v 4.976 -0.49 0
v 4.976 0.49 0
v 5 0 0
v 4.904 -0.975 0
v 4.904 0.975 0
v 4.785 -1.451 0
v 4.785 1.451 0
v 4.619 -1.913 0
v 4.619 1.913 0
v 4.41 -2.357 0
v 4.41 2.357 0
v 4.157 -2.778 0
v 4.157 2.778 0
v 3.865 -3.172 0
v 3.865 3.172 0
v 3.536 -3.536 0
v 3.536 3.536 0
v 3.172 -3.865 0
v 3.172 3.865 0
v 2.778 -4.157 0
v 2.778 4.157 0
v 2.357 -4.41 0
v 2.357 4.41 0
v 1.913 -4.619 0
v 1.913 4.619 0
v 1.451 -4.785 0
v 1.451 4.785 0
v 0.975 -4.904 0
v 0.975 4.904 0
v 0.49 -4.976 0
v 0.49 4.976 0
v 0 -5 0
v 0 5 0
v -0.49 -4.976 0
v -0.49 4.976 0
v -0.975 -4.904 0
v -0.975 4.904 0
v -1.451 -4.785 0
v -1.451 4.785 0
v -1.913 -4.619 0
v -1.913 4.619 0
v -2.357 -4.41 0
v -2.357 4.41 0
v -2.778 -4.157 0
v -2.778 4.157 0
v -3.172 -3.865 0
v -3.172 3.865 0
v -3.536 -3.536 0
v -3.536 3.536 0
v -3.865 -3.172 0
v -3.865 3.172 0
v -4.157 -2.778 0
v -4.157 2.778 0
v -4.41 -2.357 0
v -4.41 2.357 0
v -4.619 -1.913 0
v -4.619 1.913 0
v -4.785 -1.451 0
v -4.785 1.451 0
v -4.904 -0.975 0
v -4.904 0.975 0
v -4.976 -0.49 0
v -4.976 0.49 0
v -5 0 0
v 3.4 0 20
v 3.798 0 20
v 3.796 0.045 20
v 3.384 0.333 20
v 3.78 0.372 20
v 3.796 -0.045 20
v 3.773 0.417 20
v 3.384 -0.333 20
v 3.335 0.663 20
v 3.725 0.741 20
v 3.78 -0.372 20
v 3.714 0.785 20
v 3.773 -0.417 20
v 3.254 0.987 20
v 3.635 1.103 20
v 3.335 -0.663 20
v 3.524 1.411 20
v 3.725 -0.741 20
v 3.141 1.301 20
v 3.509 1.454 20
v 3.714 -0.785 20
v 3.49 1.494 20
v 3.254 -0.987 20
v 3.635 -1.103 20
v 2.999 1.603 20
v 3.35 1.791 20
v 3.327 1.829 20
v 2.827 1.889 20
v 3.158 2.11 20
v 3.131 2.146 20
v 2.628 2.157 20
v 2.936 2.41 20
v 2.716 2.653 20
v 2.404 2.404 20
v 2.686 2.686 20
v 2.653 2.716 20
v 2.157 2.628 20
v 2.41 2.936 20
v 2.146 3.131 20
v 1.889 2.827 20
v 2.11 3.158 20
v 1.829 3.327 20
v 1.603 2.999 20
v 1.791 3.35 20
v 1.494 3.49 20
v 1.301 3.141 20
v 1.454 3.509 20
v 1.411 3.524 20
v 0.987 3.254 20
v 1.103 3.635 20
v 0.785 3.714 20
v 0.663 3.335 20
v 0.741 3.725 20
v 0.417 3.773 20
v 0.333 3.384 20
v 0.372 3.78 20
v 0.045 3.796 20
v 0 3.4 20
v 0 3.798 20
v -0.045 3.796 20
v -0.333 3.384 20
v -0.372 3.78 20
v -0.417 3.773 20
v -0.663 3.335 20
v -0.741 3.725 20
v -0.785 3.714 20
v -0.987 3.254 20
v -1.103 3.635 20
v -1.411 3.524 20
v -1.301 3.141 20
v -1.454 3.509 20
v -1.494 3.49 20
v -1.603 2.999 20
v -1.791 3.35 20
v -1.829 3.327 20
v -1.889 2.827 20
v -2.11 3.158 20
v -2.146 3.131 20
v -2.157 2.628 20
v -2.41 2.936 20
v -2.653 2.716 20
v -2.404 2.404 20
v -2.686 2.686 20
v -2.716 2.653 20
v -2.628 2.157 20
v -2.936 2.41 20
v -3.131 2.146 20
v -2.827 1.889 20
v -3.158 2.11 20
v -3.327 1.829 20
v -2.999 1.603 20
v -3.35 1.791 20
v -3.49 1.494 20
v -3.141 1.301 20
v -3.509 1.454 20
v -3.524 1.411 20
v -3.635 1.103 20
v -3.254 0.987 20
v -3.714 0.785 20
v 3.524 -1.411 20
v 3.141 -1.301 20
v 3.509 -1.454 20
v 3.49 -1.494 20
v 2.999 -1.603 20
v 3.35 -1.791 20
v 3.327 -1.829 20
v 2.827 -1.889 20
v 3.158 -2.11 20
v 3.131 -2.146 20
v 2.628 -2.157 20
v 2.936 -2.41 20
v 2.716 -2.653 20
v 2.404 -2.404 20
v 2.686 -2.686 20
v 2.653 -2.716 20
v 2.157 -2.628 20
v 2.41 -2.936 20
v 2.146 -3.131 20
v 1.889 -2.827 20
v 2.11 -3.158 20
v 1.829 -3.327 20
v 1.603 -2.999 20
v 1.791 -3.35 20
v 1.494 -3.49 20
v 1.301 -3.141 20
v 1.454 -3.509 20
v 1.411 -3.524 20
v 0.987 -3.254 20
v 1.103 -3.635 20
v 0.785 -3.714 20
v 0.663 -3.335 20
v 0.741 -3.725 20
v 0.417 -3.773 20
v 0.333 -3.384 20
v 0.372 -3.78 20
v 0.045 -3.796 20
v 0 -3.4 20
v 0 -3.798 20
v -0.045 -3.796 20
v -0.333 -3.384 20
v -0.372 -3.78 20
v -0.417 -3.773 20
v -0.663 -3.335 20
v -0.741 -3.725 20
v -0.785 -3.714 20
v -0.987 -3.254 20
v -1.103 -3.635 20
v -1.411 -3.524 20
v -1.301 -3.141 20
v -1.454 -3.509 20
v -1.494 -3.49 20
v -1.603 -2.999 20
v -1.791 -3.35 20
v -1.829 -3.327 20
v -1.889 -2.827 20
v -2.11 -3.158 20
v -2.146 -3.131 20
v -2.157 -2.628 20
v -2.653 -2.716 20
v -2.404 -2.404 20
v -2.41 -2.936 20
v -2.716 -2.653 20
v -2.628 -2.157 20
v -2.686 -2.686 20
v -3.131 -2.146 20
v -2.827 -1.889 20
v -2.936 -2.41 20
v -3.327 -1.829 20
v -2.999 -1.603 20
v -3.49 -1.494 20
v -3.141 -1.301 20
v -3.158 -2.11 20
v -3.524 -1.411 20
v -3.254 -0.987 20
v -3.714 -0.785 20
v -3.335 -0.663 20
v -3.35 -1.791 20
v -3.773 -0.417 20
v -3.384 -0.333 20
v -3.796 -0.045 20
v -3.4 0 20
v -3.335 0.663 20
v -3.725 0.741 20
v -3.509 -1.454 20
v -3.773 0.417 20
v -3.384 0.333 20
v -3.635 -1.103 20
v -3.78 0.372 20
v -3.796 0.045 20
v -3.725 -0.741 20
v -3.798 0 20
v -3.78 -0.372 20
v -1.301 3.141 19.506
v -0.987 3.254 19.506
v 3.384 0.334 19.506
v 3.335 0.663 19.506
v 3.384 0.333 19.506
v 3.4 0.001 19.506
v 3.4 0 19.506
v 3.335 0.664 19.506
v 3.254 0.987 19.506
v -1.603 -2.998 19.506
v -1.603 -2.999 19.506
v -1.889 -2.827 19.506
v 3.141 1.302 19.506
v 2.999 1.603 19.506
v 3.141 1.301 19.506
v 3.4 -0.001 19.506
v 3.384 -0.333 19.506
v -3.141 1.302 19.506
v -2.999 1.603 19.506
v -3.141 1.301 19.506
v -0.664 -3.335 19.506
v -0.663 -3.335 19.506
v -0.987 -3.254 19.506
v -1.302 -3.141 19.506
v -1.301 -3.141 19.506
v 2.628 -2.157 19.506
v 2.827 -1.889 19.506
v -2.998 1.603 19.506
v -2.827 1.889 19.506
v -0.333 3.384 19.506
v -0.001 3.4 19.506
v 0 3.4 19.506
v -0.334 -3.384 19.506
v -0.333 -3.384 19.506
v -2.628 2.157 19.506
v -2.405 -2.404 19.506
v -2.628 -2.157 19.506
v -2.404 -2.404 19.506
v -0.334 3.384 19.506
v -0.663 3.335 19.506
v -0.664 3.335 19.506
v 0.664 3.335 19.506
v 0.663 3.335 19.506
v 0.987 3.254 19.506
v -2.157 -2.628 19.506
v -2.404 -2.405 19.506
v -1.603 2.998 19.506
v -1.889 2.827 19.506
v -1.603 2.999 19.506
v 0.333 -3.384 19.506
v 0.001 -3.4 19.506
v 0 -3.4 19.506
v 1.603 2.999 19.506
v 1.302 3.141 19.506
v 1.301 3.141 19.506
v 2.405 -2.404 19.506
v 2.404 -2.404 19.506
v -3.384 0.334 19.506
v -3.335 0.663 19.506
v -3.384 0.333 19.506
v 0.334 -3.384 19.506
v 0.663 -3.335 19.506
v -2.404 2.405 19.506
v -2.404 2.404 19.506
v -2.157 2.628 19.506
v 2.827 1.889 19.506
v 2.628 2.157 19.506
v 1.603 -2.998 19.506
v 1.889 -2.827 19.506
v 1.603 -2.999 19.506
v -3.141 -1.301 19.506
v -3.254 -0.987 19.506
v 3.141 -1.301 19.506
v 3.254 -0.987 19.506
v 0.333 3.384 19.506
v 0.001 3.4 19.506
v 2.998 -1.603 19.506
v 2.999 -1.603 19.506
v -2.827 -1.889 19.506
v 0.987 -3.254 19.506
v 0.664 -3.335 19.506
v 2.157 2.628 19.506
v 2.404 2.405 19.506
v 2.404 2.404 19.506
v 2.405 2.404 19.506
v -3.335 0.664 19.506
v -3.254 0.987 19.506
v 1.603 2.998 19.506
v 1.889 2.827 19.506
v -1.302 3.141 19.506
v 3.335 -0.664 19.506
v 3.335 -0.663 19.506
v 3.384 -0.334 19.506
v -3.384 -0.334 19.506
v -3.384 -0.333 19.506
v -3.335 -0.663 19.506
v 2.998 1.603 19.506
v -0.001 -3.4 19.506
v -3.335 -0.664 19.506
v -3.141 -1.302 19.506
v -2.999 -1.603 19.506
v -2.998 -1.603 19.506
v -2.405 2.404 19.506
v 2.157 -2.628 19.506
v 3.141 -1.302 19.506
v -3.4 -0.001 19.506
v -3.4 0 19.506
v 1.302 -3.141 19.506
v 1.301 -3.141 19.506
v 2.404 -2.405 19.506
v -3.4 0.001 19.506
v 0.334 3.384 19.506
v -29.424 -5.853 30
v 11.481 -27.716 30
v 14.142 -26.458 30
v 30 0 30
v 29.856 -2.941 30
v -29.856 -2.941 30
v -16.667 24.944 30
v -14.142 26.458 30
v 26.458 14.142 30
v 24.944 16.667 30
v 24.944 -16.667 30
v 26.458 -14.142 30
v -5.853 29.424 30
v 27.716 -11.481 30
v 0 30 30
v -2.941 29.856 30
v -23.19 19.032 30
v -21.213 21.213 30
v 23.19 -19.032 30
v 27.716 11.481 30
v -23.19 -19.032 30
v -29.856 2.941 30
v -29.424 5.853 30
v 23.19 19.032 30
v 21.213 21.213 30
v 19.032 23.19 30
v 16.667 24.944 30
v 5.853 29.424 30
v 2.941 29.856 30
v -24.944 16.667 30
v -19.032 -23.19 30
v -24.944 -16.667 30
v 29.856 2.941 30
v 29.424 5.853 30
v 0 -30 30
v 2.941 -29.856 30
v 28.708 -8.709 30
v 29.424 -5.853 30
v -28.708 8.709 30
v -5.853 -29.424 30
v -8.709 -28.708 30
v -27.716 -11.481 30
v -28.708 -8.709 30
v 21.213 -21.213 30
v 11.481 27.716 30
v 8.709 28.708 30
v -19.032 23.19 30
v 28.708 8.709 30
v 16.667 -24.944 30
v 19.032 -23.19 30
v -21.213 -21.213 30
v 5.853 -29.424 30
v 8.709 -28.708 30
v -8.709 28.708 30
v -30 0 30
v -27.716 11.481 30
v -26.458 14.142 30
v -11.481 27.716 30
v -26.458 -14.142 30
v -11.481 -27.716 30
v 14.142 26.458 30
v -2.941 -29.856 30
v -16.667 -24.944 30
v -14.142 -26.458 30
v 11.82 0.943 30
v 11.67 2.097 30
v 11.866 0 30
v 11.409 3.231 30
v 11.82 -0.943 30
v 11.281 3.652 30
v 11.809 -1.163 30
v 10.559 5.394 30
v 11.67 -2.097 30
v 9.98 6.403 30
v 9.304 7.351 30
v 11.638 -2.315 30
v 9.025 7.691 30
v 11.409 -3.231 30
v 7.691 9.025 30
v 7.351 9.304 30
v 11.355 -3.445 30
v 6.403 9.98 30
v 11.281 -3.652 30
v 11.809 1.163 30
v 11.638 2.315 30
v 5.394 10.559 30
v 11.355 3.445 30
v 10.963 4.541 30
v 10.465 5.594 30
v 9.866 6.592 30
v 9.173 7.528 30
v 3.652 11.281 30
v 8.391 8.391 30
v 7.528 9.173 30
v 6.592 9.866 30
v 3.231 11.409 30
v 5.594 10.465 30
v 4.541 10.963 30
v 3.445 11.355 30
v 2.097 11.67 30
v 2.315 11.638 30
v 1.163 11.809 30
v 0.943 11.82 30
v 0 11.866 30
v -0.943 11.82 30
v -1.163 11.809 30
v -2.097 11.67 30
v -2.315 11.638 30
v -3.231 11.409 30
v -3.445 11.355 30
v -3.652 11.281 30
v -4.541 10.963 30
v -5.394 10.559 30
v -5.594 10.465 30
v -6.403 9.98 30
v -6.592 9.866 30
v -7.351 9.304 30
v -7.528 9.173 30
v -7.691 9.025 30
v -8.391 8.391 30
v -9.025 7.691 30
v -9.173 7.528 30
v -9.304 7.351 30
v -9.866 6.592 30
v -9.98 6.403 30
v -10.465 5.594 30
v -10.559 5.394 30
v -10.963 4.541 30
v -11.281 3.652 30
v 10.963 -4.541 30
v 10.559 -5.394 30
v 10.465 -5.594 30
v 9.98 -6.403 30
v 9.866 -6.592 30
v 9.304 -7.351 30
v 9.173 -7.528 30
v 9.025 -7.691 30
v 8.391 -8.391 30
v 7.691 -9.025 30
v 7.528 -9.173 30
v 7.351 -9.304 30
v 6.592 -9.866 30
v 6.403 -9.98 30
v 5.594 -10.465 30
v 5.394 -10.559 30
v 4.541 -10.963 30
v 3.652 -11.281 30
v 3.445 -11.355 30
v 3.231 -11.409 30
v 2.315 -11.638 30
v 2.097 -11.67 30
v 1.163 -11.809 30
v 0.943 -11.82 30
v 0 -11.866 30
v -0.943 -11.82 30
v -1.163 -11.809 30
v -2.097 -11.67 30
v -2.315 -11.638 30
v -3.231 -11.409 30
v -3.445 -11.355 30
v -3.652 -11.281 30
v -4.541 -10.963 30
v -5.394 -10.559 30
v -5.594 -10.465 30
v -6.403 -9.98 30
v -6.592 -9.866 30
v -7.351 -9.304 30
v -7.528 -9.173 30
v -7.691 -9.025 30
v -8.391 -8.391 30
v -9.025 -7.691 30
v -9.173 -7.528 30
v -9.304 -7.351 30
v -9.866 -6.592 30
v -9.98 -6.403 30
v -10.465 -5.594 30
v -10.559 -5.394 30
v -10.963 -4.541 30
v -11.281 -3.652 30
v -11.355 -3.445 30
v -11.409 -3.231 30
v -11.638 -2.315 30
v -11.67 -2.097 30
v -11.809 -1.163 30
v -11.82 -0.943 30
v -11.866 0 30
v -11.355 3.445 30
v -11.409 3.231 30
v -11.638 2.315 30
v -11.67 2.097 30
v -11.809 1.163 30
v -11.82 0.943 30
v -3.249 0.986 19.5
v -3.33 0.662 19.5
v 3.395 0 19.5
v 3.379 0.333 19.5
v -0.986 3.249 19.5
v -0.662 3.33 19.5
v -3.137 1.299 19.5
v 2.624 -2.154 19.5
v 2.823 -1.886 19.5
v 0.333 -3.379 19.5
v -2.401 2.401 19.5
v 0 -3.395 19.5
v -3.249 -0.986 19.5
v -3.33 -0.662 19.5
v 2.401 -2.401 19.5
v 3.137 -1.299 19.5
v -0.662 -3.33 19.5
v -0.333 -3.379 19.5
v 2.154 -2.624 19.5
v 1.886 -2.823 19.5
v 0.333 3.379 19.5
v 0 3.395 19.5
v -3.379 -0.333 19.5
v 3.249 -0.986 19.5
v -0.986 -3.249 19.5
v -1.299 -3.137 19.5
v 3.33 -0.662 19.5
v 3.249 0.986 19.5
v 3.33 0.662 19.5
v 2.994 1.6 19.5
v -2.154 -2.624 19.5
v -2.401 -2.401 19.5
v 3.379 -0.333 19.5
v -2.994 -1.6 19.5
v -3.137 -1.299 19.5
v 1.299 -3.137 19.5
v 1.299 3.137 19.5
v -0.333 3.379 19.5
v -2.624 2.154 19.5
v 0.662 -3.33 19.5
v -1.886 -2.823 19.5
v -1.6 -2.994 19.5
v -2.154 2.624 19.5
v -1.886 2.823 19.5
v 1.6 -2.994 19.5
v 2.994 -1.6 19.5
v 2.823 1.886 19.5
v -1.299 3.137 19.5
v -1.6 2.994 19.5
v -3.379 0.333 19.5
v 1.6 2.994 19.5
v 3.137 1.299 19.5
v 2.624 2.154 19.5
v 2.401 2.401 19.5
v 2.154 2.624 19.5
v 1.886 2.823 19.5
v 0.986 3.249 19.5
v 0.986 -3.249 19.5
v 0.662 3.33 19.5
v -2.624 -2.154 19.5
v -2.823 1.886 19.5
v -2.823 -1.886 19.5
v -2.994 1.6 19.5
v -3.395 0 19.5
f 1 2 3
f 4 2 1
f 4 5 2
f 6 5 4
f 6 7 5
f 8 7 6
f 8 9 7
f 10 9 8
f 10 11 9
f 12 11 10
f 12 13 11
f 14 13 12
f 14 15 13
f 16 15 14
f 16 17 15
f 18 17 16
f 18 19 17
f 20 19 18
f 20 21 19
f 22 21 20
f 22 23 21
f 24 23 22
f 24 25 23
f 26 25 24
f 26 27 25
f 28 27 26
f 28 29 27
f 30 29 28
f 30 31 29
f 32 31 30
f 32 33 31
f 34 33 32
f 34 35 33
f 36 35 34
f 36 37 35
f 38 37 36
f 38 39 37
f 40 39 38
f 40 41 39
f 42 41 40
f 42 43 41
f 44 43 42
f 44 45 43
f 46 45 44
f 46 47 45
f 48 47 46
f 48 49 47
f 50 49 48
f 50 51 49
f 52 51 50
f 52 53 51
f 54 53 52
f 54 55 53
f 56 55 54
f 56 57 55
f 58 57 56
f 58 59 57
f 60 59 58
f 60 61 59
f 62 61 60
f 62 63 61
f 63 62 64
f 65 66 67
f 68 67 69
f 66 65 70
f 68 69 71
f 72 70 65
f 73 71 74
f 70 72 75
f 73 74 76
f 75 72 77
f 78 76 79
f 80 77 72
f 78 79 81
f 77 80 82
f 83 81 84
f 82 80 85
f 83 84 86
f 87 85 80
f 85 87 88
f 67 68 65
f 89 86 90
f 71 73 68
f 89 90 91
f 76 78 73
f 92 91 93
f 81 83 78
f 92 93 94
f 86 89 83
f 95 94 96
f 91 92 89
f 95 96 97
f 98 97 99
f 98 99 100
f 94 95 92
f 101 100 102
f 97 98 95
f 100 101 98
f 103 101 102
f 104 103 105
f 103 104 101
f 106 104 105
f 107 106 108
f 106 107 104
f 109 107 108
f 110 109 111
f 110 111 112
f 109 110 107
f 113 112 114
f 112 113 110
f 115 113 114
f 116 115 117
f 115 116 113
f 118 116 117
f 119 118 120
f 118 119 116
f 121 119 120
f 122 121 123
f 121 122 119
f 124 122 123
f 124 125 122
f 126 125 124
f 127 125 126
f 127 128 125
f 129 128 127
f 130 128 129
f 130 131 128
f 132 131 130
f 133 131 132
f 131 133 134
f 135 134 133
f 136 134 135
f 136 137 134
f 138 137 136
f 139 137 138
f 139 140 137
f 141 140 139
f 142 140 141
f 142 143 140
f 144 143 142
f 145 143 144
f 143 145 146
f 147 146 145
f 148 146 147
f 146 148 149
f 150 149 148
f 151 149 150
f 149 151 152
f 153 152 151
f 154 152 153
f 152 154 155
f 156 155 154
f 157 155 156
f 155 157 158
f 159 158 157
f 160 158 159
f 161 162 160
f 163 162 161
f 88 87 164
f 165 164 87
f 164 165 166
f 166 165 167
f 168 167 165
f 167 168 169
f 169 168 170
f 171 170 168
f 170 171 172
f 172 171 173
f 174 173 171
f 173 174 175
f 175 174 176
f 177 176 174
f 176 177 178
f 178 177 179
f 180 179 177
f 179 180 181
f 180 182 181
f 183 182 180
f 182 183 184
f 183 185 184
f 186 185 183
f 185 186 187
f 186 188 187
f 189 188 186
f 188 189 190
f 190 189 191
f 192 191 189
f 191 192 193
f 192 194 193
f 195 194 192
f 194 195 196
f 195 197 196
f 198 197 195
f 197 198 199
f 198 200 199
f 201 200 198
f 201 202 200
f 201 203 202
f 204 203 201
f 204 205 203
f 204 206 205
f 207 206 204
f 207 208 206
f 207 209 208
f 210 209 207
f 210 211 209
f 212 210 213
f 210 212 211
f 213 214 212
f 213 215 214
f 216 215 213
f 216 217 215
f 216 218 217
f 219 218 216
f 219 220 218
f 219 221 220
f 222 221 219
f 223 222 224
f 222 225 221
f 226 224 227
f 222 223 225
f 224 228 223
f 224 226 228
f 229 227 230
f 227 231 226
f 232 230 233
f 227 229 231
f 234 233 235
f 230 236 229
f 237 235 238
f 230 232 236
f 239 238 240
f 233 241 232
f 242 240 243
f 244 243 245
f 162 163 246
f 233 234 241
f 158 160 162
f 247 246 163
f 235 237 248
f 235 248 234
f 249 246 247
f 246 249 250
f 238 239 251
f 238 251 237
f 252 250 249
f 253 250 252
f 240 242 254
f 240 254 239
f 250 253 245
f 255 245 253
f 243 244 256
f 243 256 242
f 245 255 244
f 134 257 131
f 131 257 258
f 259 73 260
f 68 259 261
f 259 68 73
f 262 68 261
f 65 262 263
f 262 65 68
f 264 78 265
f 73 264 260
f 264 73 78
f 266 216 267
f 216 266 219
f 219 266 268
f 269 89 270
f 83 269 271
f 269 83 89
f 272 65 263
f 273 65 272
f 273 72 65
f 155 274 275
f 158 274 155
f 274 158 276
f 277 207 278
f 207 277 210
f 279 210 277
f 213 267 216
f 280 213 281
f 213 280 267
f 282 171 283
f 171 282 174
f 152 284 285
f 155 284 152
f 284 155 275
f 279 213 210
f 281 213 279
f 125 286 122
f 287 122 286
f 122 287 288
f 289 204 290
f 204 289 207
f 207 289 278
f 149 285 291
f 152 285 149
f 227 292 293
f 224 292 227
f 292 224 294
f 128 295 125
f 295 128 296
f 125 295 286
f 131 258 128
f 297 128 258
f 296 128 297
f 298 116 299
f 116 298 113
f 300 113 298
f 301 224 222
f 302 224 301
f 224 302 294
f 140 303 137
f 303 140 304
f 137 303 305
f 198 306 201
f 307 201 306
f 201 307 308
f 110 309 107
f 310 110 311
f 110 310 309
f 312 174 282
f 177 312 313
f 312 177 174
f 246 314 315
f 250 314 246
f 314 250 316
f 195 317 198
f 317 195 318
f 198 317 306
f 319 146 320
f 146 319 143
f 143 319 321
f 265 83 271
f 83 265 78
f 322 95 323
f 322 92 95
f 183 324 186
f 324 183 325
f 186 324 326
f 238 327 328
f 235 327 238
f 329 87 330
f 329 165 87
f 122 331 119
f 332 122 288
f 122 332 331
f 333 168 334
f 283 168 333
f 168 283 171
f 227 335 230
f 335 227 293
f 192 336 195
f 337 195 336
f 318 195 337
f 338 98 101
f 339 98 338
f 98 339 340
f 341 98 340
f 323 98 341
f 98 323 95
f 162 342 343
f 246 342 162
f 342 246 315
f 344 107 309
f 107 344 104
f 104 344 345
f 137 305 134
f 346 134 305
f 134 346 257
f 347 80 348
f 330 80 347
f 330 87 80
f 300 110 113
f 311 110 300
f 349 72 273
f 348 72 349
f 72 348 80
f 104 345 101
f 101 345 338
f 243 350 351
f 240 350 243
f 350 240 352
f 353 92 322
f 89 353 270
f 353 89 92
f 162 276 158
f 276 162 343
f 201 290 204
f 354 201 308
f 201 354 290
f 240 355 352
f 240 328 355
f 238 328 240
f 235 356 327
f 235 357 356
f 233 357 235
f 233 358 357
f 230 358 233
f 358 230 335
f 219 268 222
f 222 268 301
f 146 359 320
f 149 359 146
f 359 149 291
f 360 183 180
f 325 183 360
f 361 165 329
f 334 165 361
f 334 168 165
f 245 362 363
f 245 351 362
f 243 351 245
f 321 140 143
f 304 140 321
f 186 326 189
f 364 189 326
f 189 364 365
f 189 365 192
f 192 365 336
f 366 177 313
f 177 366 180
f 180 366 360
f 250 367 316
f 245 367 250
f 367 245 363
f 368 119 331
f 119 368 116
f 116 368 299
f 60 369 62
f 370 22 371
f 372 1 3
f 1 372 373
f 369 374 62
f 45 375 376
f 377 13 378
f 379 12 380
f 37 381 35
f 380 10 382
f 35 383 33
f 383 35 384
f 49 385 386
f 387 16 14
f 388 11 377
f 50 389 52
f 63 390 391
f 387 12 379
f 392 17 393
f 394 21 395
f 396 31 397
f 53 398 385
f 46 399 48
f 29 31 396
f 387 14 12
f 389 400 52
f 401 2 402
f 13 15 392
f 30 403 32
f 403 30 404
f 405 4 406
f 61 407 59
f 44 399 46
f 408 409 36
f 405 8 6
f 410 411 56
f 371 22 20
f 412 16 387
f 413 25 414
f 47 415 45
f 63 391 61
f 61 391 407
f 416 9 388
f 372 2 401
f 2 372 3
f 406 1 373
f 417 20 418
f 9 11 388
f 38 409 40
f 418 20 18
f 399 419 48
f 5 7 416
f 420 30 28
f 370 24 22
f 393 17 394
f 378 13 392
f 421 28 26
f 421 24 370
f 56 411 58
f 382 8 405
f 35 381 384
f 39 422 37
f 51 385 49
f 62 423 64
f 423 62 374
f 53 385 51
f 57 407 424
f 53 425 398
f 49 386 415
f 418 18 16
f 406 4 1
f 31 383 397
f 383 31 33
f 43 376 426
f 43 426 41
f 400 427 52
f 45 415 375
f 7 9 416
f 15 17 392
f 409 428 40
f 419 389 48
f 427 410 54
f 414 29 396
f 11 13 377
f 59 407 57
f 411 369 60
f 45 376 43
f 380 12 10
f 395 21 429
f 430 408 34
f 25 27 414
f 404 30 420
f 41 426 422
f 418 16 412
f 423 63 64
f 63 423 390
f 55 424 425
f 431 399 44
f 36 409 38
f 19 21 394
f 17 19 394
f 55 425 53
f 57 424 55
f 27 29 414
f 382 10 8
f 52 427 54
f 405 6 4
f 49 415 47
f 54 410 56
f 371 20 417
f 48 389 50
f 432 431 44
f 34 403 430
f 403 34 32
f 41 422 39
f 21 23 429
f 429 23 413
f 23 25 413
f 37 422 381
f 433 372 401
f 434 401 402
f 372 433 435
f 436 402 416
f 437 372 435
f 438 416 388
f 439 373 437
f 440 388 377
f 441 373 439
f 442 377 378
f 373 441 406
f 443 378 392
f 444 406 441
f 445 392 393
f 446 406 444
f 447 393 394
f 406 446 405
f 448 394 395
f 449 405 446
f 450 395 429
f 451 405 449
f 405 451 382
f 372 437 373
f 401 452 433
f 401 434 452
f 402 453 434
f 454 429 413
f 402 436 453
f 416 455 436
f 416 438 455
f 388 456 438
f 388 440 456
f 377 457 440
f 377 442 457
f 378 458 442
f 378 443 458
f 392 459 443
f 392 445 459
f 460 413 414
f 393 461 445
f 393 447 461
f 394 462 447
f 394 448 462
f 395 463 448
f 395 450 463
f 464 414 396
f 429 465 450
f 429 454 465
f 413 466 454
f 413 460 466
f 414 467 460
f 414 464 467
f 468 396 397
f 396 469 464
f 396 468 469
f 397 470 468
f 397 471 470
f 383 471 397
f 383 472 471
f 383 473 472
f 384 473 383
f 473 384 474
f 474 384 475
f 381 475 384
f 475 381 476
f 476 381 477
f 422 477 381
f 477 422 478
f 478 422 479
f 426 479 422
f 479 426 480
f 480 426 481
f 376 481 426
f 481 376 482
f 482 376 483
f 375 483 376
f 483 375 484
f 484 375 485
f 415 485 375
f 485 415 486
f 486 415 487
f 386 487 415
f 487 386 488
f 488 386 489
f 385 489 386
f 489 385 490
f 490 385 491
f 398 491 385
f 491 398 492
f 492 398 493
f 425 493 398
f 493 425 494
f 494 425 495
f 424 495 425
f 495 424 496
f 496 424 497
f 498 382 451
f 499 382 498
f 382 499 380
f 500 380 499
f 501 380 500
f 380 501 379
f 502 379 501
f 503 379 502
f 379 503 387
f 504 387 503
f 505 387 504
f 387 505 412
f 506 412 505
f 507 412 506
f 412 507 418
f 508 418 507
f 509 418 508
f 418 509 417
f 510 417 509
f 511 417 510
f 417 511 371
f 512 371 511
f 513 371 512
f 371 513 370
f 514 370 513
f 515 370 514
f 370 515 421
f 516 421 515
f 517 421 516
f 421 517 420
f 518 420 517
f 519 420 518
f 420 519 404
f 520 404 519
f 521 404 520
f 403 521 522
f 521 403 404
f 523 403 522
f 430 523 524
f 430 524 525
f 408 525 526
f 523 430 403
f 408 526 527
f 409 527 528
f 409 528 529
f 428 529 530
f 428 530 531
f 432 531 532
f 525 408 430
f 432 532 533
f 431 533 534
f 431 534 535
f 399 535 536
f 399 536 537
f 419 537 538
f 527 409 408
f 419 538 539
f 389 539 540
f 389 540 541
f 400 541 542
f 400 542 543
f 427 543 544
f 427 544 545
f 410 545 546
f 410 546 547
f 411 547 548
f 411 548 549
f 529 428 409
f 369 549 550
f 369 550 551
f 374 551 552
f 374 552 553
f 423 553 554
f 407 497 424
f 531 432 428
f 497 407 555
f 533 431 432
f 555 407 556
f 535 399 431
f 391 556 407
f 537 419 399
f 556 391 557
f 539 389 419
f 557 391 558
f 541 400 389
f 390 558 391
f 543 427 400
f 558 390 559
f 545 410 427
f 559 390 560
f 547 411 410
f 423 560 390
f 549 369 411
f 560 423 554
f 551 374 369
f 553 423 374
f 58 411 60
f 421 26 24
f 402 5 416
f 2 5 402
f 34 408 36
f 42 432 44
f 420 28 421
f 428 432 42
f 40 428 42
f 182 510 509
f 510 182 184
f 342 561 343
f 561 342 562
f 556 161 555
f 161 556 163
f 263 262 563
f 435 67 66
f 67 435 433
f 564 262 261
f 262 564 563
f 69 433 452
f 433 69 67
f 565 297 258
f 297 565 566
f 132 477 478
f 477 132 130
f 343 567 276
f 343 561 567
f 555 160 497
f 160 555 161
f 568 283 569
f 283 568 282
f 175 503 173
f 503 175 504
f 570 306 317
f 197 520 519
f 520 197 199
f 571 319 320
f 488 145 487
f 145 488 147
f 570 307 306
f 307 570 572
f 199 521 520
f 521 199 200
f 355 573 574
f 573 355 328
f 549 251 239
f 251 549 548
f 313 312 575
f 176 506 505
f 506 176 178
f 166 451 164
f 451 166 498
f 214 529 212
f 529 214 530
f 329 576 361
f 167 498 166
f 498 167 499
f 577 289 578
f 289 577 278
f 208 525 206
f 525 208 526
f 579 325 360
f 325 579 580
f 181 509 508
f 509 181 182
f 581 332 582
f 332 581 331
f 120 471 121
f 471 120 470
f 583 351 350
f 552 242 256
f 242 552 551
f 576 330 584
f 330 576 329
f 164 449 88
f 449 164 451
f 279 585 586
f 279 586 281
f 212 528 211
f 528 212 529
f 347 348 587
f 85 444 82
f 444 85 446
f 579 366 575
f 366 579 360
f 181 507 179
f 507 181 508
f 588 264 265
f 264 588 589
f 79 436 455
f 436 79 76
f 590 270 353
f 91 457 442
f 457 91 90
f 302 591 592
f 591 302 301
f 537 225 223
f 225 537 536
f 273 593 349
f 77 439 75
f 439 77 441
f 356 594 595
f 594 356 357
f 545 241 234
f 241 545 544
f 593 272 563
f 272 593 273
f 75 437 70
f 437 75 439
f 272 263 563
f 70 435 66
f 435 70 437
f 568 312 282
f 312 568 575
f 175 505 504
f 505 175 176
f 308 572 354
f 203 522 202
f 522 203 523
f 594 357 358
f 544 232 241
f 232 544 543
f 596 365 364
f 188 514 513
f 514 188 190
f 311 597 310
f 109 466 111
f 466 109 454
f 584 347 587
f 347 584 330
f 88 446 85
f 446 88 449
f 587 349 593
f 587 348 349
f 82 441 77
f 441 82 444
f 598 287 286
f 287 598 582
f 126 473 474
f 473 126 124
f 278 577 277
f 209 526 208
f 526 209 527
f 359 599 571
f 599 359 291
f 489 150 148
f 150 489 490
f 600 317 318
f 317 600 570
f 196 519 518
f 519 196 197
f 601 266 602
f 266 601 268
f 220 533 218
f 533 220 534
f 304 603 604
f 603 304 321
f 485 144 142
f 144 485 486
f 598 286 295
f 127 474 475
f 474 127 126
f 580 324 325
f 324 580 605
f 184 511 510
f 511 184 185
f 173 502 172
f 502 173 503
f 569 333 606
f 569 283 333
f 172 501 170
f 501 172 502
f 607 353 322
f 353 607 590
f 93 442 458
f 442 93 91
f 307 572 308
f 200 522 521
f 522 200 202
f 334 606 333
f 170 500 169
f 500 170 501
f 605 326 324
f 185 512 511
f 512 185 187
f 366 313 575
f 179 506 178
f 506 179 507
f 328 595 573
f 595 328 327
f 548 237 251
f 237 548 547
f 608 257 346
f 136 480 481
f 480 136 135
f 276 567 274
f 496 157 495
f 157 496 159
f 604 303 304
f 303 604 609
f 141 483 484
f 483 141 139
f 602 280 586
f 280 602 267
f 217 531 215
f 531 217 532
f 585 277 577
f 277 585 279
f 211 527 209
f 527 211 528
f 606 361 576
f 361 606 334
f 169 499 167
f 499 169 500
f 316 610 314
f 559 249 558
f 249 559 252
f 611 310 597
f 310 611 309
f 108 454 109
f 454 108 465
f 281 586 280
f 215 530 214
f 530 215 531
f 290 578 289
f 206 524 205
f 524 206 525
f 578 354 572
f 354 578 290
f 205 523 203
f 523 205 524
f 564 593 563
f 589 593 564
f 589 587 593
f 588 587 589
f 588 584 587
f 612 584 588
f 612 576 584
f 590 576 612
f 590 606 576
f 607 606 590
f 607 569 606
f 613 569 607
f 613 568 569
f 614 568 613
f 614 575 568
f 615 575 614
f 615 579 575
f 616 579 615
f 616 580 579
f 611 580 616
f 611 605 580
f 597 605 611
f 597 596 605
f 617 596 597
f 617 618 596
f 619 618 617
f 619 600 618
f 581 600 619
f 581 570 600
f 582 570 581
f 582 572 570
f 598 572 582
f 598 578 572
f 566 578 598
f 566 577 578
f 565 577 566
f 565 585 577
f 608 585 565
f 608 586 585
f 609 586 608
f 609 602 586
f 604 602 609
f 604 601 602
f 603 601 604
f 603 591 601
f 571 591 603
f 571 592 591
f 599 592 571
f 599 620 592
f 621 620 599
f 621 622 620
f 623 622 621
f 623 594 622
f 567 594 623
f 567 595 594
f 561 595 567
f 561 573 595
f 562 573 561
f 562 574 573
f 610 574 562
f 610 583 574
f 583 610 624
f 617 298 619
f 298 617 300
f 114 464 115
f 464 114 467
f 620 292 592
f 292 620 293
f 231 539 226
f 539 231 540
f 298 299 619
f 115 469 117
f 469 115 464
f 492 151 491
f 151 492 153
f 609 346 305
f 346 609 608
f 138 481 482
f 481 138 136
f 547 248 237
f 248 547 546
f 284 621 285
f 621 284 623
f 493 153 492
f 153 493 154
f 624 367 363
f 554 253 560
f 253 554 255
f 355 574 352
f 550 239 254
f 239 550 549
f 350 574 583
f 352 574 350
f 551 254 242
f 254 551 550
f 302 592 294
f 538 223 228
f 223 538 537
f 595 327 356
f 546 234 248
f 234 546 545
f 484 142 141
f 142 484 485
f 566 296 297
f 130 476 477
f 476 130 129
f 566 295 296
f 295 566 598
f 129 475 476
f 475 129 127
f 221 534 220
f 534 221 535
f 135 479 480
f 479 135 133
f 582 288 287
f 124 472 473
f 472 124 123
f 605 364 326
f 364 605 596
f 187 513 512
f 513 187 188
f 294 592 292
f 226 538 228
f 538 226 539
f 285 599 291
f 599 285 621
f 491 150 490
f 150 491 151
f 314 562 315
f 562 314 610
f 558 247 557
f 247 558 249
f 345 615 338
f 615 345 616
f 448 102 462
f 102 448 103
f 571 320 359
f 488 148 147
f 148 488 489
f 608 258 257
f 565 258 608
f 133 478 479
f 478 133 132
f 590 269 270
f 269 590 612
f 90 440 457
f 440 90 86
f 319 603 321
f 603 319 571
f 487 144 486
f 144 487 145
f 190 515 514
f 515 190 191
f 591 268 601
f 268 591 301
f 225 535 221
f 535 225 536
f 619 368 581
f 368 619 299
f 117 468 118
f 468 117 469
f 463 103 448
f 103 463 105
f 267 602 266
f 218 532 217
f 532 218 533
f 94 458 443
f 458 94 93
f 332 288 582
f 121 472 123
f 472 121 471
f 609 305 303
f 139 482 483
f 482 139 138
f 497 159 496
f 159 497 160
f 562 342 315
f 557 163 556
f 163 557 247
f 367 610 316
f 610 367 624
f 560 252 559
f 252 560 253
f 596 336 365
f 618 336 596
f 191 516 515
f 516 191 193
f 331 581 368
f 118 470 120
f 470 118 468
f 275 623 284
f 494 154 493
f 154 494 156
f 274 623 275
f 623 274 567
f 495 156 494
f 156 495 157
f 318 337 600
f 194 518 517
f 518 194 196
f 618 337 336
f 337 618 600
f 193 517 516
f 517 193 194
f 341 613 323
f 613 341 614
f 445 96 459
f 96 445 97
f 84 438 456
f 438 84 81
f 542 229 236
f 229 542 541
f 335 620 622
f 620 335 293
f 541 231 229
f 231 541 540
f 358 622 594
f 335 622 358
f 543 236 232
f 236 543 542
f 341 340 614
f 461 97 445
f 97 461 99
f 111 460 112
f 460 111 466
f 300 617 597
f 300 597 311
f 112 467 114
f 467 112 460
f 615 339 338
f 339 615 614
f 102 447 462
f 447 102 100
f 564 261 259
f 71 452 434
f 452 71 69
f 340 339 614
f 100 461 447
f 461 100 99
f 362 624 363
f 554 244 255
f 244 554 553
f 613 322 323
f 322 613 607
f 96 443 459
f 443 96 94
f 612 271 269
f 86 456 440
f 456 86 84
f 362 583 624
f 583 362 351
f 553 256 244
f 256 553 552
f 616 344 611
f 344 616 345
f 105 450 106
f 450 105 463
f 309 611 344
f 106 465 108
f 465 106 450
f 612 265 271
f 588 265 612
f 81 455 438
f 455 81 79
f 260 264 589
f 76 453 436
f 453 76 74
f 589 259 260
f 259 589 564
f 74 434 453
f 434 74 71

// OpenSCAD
// Funnel with spout - printed upright, wide opening at top
// Units: mm. Wall thickness 1.6 mm throughout.

// ---------- Parameters ----------
spout_od      = 10;    // spout outer diameter
spout_length  = 20;    // spout runs from z = 0 to z = 20
cone_top_d    = 60;    // cone rim outer diameter at z = 50
cone_bottom_d = 10;    // cone starts at same diameter as spout (z = 20)
rim_height    = 30;    // cone height, so rim at z = 20 + 30 = 50
wall          = 1.6;   // wall thickness everywhere
eps           = 0.5;   // cutter overshoot past faces

$fn = 64;

// ---------- Derived ----------
spout_id = spout_od - 2 * wall;   // bore of spout (6.8 mm)
cone_top_id = cone_top_d - 2 * wall;  // rim inner diameter (56.8 mm)

// ---------- Model ----------
union() {
    // Spout: tube from z = 0 to z = 20
    difference() {
        cylinder(d = spout_od, h = spout_length);
        translate([0, 0, -eps])
            cylinder(d = spout_id, h = spout_length + 2 * eps);
    }

    // Cone: widens from 10 mm (z = 20) to 60 mm (z = 50)
    difference() {
        cylinder(d1 = cone_bottom_d, d2 = cone_top_d, h = rim_height, $fn = 64);
        translate([0, 0, spout_length - eps])
            cylinder(d1 = cone_bottom_d - 2 * wall - 0.01,
                     d2 = cone_top_id + 0.01,
                     h = rim_height + 2 * eps,
                     $fn = 64);   // open-mouthed cone through z = 50
    }
}
